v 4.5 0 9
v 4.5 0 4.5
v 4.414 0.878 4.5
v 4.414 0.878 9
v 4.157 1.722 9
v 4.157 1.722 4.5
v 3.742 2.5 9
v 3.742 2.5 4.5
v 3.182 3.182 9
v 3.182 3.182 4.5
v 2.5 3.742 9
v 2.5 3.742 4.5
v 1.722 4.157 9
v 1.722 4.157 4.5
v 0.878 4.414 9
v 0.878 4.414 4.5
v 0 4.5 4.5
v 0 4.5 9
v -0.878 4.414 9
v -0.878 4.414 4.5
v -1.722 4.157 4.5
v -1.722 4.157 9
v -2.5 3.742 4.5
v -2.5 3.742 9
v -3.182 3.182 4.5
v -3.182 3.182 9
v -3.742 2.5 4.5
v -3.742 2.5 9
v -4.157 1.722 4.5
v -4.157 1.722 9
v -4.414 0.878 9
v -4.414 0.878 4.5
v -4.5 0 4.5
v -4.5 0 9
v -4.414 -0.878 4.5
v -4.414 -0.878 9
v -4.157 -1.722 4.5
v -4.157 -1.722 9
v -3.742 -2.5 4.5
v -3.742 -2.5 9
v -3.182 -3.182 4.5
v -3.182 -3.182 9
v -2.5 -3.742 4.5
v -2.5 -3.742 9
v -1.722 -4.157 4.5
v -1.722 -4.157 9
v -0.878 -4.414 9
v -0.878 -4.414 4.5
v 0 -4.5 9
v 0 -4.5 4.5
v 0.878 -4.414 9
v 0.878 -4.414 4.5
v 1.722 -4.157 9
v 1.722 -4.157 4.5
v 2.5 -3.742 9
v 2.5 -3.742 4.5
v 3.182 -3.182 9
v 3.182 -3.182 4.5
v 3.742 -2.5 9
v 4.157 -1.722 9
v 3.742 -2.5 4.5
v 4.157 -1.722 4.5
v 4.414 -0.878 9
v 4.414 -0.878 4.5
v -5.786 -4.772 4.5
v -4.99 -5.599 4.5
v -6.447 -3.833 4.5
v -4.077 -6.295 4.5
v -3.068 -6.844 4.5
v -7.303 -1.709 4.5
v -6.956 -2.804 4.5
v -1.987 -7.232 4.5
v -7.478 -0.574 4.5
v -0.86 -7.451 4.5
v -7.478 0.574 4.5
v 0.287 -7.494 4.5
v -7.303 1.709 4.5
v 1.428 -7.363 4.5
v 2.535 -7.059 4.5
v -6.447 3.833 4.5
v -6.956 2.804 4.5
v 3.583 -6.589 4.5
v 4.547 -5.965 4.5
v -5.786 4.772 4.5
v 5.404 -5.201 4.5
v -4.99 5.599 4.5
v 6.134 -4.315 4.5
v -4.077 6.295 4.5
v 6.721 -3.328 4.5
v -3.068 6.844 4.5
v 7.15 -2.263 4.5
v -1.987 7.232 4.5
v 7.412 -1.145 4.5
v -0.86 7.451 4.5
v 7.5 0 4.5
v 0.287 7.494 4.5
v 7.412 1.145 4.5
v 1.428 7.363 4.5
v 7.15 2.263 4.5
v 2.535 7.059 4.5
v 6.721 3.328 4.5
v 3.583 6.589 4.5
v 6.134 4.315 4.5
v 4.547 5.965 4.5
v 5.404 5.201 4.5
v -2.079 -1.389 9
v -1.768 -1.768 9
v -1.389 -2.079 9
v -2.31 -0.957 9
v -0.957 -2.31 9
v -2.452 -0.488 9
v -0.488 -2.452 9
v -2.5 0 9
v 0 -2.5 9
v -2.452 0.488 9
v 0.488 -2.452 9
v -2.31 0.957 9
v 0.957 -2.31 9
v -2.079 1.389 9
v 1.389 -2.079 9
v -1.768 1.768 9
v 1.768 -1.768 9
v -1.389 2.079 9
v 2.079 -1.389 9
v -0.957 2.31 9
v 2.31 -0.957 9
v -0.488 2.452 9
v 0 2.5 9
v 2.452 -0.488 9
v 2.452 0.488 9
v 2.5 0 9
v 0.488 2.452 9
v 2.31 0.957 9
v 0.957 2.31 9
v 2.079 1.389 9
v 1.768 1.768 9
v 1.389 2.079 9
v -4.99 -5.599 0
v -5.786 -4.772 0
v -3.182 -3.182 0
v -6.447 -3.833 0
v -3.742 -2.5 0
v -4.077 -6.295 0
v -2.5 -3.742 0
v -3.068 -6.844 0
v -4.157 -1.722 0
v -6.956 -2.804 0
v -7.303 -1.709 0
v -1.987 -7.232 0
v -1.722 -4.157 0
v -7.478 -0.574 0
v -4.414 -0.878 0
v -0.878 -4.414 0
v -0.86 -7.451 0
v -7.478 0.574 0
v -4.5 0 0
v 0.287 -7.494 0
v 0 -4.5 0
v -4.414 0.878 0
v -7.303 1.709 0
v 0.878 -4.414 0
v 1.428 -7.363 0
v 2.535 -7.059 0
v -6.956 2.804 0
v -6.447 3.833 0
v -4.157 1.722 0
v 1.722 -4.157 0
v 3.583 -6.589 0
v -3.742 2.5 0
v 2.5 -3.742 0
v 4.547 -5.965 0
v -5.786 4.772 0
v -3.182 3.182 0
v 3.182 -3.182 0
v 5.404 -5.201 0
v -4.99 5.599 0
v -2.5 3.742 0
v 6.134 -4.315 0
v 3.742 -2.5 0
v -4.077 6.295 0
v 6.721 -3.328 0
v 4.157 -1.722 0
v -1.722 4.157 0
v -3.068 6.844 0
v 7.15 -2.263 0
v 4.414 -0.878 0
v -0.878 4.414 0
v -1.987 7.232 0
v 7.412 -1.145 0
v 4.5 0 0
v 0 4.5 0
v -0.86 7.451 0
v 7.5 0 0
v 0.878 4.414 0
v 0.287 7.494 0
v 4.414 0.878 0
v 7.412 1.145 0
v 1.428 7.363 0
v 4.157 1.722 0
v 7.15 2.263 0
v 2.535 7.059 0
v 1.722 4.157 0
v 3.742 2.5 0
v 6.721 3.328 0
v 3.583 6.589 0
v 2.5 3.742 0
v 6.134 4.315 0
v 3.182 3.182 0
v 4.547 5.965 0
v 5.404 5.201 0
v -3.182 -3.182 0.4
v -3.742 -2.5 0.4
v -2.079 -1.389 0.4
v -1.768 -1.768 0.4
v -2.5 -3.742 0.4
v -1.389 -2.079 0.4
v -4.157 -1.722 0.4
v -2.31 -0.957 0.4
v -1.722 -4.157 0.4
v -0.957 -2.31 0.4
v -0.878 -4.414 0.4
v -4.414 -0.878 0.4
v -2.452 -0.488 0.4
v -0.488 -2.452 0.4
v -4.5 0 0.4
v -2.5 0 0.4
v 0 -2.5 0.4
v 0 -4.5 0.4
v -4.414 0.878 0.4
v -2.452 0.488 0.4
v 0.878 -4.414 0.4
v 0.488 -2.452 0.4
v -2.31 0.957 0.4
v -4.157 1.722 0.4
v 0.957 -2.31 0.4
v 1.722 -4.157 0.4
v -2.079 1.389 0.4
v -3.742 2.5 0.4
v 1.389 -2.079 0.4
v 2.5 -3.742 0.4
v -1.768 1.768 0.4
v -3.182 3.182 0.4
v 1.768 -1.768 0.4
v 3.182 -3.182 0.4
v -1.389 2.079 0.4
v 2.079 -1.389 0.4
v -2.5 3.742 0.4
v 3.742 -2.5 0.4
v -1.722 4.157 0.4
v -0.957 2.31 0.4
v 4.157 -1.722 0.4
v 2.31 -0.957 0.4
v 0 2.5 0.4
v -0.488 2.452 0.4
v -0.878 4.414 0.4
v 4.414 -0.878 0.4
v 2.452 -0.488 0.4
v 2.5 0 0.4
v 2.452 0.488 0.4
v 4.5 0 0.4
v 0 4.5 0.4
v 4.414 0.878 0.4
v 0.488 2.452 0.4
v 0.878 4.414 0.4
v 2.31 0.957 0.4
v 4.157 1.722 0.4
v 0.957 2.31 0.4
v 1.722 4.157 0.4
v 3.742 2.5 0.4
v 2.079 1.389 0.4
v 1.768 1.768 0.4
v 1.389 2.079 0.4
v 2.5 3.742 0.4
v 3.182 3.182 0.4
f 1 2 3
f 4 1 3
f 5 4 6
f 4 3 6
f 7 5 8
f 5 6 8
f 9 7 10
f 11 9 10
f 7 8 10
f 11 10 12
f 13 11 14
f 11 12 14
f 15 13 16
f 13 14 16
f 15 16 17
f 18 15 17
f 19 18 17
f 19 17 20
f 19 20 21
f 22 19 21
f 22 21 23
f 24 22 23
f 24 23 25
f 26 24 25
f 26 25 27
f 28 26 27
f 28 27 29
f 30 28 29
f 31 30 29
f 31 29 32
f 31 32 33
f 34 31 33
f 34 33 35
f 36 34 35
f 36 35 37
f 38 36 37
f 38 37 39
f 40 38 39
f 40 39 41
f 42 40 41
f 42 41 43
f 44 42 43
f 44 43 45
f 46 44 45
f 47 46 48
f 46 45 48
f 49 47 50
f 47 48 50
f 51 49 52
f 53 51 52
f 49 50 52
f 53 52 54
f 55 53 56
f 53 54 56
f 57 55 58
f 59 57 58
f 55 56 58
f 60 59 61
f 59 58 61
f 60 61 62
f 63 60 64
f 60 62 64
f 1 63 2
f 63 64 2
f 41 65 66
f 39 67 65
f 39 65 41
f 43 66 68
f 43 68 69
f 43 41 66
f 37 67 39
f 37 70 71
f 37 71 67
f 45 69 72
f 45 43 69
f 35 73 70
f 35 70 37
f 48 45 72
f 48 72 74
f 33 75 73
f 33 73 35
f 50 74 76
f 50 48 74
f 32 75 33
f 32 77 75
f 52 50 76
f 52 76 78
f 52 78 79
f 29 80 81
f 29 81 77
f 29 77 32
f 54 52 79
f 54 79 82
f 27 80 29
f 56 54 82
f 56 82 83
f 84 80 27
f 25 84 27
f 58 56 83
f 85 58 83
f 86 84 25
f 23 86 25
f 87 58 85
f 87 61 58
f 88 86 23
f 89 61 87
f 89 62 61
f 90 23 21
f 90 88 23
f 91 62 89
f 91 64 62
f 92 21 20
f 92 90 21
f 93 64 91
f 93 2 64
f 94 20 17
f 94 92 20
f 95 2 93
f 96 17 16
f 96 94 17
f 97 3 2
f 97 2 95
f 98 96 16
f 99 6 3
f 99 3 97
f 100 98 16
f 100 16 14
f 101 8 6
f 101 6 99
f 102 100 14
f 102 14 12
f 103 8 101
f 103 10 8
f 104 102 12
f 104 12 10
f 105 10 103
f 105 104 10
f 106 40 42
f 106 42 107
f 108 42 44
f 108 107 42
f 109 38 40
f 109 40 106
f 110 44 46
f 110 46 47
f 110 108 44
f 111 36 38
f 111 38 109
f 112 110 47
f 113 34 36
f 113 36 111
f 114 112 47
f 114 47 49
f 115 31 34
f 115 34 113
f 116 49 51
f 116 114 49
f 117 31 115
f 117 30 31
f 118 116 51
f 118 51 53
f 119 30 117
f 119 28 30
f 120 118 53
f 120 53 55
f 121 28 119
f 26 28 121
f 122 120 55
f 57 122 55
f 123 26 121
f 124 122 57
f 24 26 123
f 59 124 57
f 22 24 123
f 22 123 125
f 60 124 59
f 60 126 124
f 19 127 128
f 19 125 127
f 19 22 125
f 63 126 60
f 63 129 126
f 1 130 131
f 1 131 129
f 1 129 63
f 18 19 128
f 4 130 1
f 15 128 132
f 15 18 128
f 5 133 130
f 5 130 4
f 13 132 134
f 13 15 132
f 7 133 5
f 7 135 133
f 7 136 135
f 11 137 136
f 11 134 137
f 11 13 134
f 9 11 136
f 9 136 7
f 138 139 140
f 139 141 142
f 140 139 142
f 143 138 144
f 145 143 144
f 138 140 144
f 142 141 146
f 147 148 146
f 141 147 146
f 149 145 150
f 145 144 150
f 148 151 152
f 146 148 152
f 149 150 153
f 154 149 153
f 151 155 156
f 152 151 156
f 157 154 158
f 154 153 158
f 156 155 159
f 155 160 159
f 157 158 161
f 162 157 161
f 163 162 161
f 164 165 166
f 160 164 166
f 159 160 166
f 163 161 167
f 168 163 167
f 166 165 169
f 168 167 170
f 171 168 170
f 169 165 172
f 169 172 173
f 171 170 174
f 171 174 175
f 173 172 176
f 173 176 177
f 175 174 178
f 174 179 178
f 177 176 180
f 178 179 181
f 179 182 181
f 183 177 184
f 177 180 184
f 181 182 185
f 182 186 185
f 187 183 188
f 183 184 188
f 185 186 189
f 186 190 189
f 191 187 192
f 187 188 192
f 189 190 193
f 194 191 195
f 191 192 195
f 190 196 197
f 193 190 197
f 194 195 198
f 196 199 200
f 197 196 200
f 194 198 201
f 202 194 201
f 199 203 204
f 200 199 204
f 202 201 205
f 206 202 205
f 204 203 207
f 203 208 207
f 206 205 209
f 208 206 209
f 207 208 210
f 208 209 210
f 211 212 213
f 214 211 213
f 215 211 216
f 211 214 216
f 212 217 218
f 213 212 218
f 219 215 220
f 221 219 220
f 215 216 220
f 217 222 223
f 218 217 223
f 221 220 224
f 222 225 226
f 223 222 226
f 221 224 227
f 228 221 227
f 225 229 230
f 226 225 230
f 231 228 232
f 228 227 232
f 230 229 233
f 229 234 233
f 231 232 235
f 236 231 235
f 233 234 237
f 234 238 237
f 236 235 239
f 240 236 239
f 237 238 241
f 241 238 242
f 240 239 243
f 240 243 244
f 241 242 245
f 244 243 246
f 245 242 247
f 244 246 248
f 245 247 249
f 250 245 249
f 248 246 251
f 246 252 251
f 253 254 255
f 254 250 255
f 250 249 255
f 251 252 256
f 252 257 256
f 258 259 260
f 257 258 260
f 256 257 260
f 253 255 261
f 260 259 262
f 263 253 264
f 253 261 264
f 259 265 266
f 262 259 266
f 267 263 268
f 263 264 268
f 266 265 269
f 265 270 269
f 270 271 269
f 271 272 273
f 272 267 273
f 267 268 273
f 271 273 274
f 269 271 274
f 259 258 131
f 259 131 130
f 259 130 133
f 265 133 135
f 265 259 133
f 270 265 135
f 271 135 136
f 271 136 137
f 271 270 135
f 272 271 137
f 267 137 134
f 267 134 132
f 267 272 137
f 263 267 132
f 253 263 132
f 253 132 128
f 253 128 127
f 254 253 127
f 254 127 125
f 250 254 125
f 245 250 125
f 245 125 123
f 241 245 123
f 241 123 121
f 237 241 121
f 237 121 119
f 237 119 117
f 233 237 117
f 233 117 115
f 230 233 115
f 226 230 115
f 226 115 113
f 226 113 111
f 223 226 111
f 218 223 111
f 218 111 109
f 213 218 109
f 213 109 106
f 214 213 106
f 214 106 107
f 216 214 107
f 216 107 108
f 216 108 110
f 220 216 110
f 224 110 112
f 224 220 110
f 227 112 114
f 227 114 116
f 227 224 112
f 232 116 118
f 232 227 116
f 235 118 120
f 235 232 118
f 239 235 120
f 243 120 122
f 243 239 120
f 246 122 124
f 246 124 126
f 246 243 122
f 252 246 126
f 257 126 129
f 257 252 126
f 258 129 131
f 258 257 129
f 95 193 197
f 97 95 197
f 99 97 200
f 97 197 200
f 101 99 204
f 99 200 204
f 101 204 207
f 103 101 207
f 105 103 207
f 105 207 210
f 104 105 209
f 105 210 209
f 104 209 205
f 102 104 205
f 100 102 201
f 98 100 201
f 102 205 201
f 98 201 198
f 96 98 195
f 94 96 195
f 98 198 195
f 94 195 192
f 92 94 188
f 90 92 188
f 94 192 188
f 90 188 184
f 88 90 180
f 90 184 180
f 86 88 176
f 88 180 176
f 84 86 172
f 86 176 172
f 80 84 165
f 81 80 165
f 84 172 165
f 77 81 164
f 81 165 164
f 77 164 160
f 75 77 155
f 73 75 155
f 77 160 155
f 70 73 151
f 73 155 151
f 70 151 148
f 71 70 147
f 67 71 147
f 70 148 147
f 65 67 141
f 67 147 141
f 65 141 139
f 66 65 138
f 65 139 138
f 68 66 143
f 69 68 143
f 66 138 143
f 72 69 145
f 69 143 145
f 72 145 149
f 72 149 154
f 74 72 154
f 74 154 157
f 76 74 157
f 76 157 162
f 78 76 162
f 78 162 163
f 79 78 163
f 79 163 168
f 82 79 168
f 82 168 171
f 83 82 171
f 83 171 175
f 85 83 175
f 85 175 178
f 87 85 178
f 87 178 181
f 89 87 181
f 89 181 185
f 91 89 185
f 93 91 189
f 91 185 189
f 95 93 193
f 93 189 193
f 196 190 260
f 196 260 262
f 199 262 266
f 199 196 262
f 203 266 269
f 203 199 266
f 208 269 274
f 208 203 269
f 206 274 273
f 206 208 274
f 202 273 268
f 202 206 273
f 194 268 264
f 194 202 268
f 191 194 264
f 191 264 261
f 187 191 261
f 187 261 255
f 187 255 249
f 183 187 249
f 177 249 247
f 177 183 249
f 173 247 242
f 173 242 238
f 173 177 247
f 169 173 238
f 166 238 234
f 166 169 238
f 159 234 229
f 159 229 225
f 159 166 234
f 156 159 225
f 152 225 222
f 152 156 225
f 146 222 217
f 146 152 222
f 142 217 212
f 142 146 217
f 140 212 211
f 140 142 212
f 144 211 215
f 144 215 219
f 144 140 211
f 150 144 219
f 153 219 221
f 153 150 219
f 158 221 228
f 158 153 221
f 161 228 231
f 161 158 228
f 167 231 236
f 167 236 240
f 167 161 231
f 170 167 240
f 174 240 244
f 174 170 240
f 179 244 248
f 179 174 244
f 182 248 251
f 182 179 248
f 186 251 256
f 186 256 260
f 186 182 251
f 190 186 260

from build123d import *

# Parameters (mm, degrees)
F0_R     = 4.5
F0_R_2   = 2.5
F1_DEPTH = 9
F0_R_3   = 7.5
F2_DEPTH = 4.5
F3_DEPTH = 0.4


with BuildPart() as f1:
    # F0 (on Top) → F1 (new body)
    with BuildSketch(Plane.XY):
        Circle(F0_R)
        Circle(F0_R_2, mode=Mode.SUBTRACT)
    extrude(amount=F1_DEPTH)

    # F0 (on Top) → F2 (join)
    with BuildSketch(Plane.XY):
        Circle(F0_R_3)
        Circle(F0_R, mode=Mode.SUBTRACT)
    extrude(amount=F2_DEPTH)

    # F0 (on Top) → F3 (cut)
    with BuildSketch(Plane.XY):
        Circle(F0_R)
        Circle(F0_R_2, mode=Mode.SUBTRACT)
    extrude(amount=F3_DEPTH, mode=Mode.SUBTRACT)


solid = f1.part
